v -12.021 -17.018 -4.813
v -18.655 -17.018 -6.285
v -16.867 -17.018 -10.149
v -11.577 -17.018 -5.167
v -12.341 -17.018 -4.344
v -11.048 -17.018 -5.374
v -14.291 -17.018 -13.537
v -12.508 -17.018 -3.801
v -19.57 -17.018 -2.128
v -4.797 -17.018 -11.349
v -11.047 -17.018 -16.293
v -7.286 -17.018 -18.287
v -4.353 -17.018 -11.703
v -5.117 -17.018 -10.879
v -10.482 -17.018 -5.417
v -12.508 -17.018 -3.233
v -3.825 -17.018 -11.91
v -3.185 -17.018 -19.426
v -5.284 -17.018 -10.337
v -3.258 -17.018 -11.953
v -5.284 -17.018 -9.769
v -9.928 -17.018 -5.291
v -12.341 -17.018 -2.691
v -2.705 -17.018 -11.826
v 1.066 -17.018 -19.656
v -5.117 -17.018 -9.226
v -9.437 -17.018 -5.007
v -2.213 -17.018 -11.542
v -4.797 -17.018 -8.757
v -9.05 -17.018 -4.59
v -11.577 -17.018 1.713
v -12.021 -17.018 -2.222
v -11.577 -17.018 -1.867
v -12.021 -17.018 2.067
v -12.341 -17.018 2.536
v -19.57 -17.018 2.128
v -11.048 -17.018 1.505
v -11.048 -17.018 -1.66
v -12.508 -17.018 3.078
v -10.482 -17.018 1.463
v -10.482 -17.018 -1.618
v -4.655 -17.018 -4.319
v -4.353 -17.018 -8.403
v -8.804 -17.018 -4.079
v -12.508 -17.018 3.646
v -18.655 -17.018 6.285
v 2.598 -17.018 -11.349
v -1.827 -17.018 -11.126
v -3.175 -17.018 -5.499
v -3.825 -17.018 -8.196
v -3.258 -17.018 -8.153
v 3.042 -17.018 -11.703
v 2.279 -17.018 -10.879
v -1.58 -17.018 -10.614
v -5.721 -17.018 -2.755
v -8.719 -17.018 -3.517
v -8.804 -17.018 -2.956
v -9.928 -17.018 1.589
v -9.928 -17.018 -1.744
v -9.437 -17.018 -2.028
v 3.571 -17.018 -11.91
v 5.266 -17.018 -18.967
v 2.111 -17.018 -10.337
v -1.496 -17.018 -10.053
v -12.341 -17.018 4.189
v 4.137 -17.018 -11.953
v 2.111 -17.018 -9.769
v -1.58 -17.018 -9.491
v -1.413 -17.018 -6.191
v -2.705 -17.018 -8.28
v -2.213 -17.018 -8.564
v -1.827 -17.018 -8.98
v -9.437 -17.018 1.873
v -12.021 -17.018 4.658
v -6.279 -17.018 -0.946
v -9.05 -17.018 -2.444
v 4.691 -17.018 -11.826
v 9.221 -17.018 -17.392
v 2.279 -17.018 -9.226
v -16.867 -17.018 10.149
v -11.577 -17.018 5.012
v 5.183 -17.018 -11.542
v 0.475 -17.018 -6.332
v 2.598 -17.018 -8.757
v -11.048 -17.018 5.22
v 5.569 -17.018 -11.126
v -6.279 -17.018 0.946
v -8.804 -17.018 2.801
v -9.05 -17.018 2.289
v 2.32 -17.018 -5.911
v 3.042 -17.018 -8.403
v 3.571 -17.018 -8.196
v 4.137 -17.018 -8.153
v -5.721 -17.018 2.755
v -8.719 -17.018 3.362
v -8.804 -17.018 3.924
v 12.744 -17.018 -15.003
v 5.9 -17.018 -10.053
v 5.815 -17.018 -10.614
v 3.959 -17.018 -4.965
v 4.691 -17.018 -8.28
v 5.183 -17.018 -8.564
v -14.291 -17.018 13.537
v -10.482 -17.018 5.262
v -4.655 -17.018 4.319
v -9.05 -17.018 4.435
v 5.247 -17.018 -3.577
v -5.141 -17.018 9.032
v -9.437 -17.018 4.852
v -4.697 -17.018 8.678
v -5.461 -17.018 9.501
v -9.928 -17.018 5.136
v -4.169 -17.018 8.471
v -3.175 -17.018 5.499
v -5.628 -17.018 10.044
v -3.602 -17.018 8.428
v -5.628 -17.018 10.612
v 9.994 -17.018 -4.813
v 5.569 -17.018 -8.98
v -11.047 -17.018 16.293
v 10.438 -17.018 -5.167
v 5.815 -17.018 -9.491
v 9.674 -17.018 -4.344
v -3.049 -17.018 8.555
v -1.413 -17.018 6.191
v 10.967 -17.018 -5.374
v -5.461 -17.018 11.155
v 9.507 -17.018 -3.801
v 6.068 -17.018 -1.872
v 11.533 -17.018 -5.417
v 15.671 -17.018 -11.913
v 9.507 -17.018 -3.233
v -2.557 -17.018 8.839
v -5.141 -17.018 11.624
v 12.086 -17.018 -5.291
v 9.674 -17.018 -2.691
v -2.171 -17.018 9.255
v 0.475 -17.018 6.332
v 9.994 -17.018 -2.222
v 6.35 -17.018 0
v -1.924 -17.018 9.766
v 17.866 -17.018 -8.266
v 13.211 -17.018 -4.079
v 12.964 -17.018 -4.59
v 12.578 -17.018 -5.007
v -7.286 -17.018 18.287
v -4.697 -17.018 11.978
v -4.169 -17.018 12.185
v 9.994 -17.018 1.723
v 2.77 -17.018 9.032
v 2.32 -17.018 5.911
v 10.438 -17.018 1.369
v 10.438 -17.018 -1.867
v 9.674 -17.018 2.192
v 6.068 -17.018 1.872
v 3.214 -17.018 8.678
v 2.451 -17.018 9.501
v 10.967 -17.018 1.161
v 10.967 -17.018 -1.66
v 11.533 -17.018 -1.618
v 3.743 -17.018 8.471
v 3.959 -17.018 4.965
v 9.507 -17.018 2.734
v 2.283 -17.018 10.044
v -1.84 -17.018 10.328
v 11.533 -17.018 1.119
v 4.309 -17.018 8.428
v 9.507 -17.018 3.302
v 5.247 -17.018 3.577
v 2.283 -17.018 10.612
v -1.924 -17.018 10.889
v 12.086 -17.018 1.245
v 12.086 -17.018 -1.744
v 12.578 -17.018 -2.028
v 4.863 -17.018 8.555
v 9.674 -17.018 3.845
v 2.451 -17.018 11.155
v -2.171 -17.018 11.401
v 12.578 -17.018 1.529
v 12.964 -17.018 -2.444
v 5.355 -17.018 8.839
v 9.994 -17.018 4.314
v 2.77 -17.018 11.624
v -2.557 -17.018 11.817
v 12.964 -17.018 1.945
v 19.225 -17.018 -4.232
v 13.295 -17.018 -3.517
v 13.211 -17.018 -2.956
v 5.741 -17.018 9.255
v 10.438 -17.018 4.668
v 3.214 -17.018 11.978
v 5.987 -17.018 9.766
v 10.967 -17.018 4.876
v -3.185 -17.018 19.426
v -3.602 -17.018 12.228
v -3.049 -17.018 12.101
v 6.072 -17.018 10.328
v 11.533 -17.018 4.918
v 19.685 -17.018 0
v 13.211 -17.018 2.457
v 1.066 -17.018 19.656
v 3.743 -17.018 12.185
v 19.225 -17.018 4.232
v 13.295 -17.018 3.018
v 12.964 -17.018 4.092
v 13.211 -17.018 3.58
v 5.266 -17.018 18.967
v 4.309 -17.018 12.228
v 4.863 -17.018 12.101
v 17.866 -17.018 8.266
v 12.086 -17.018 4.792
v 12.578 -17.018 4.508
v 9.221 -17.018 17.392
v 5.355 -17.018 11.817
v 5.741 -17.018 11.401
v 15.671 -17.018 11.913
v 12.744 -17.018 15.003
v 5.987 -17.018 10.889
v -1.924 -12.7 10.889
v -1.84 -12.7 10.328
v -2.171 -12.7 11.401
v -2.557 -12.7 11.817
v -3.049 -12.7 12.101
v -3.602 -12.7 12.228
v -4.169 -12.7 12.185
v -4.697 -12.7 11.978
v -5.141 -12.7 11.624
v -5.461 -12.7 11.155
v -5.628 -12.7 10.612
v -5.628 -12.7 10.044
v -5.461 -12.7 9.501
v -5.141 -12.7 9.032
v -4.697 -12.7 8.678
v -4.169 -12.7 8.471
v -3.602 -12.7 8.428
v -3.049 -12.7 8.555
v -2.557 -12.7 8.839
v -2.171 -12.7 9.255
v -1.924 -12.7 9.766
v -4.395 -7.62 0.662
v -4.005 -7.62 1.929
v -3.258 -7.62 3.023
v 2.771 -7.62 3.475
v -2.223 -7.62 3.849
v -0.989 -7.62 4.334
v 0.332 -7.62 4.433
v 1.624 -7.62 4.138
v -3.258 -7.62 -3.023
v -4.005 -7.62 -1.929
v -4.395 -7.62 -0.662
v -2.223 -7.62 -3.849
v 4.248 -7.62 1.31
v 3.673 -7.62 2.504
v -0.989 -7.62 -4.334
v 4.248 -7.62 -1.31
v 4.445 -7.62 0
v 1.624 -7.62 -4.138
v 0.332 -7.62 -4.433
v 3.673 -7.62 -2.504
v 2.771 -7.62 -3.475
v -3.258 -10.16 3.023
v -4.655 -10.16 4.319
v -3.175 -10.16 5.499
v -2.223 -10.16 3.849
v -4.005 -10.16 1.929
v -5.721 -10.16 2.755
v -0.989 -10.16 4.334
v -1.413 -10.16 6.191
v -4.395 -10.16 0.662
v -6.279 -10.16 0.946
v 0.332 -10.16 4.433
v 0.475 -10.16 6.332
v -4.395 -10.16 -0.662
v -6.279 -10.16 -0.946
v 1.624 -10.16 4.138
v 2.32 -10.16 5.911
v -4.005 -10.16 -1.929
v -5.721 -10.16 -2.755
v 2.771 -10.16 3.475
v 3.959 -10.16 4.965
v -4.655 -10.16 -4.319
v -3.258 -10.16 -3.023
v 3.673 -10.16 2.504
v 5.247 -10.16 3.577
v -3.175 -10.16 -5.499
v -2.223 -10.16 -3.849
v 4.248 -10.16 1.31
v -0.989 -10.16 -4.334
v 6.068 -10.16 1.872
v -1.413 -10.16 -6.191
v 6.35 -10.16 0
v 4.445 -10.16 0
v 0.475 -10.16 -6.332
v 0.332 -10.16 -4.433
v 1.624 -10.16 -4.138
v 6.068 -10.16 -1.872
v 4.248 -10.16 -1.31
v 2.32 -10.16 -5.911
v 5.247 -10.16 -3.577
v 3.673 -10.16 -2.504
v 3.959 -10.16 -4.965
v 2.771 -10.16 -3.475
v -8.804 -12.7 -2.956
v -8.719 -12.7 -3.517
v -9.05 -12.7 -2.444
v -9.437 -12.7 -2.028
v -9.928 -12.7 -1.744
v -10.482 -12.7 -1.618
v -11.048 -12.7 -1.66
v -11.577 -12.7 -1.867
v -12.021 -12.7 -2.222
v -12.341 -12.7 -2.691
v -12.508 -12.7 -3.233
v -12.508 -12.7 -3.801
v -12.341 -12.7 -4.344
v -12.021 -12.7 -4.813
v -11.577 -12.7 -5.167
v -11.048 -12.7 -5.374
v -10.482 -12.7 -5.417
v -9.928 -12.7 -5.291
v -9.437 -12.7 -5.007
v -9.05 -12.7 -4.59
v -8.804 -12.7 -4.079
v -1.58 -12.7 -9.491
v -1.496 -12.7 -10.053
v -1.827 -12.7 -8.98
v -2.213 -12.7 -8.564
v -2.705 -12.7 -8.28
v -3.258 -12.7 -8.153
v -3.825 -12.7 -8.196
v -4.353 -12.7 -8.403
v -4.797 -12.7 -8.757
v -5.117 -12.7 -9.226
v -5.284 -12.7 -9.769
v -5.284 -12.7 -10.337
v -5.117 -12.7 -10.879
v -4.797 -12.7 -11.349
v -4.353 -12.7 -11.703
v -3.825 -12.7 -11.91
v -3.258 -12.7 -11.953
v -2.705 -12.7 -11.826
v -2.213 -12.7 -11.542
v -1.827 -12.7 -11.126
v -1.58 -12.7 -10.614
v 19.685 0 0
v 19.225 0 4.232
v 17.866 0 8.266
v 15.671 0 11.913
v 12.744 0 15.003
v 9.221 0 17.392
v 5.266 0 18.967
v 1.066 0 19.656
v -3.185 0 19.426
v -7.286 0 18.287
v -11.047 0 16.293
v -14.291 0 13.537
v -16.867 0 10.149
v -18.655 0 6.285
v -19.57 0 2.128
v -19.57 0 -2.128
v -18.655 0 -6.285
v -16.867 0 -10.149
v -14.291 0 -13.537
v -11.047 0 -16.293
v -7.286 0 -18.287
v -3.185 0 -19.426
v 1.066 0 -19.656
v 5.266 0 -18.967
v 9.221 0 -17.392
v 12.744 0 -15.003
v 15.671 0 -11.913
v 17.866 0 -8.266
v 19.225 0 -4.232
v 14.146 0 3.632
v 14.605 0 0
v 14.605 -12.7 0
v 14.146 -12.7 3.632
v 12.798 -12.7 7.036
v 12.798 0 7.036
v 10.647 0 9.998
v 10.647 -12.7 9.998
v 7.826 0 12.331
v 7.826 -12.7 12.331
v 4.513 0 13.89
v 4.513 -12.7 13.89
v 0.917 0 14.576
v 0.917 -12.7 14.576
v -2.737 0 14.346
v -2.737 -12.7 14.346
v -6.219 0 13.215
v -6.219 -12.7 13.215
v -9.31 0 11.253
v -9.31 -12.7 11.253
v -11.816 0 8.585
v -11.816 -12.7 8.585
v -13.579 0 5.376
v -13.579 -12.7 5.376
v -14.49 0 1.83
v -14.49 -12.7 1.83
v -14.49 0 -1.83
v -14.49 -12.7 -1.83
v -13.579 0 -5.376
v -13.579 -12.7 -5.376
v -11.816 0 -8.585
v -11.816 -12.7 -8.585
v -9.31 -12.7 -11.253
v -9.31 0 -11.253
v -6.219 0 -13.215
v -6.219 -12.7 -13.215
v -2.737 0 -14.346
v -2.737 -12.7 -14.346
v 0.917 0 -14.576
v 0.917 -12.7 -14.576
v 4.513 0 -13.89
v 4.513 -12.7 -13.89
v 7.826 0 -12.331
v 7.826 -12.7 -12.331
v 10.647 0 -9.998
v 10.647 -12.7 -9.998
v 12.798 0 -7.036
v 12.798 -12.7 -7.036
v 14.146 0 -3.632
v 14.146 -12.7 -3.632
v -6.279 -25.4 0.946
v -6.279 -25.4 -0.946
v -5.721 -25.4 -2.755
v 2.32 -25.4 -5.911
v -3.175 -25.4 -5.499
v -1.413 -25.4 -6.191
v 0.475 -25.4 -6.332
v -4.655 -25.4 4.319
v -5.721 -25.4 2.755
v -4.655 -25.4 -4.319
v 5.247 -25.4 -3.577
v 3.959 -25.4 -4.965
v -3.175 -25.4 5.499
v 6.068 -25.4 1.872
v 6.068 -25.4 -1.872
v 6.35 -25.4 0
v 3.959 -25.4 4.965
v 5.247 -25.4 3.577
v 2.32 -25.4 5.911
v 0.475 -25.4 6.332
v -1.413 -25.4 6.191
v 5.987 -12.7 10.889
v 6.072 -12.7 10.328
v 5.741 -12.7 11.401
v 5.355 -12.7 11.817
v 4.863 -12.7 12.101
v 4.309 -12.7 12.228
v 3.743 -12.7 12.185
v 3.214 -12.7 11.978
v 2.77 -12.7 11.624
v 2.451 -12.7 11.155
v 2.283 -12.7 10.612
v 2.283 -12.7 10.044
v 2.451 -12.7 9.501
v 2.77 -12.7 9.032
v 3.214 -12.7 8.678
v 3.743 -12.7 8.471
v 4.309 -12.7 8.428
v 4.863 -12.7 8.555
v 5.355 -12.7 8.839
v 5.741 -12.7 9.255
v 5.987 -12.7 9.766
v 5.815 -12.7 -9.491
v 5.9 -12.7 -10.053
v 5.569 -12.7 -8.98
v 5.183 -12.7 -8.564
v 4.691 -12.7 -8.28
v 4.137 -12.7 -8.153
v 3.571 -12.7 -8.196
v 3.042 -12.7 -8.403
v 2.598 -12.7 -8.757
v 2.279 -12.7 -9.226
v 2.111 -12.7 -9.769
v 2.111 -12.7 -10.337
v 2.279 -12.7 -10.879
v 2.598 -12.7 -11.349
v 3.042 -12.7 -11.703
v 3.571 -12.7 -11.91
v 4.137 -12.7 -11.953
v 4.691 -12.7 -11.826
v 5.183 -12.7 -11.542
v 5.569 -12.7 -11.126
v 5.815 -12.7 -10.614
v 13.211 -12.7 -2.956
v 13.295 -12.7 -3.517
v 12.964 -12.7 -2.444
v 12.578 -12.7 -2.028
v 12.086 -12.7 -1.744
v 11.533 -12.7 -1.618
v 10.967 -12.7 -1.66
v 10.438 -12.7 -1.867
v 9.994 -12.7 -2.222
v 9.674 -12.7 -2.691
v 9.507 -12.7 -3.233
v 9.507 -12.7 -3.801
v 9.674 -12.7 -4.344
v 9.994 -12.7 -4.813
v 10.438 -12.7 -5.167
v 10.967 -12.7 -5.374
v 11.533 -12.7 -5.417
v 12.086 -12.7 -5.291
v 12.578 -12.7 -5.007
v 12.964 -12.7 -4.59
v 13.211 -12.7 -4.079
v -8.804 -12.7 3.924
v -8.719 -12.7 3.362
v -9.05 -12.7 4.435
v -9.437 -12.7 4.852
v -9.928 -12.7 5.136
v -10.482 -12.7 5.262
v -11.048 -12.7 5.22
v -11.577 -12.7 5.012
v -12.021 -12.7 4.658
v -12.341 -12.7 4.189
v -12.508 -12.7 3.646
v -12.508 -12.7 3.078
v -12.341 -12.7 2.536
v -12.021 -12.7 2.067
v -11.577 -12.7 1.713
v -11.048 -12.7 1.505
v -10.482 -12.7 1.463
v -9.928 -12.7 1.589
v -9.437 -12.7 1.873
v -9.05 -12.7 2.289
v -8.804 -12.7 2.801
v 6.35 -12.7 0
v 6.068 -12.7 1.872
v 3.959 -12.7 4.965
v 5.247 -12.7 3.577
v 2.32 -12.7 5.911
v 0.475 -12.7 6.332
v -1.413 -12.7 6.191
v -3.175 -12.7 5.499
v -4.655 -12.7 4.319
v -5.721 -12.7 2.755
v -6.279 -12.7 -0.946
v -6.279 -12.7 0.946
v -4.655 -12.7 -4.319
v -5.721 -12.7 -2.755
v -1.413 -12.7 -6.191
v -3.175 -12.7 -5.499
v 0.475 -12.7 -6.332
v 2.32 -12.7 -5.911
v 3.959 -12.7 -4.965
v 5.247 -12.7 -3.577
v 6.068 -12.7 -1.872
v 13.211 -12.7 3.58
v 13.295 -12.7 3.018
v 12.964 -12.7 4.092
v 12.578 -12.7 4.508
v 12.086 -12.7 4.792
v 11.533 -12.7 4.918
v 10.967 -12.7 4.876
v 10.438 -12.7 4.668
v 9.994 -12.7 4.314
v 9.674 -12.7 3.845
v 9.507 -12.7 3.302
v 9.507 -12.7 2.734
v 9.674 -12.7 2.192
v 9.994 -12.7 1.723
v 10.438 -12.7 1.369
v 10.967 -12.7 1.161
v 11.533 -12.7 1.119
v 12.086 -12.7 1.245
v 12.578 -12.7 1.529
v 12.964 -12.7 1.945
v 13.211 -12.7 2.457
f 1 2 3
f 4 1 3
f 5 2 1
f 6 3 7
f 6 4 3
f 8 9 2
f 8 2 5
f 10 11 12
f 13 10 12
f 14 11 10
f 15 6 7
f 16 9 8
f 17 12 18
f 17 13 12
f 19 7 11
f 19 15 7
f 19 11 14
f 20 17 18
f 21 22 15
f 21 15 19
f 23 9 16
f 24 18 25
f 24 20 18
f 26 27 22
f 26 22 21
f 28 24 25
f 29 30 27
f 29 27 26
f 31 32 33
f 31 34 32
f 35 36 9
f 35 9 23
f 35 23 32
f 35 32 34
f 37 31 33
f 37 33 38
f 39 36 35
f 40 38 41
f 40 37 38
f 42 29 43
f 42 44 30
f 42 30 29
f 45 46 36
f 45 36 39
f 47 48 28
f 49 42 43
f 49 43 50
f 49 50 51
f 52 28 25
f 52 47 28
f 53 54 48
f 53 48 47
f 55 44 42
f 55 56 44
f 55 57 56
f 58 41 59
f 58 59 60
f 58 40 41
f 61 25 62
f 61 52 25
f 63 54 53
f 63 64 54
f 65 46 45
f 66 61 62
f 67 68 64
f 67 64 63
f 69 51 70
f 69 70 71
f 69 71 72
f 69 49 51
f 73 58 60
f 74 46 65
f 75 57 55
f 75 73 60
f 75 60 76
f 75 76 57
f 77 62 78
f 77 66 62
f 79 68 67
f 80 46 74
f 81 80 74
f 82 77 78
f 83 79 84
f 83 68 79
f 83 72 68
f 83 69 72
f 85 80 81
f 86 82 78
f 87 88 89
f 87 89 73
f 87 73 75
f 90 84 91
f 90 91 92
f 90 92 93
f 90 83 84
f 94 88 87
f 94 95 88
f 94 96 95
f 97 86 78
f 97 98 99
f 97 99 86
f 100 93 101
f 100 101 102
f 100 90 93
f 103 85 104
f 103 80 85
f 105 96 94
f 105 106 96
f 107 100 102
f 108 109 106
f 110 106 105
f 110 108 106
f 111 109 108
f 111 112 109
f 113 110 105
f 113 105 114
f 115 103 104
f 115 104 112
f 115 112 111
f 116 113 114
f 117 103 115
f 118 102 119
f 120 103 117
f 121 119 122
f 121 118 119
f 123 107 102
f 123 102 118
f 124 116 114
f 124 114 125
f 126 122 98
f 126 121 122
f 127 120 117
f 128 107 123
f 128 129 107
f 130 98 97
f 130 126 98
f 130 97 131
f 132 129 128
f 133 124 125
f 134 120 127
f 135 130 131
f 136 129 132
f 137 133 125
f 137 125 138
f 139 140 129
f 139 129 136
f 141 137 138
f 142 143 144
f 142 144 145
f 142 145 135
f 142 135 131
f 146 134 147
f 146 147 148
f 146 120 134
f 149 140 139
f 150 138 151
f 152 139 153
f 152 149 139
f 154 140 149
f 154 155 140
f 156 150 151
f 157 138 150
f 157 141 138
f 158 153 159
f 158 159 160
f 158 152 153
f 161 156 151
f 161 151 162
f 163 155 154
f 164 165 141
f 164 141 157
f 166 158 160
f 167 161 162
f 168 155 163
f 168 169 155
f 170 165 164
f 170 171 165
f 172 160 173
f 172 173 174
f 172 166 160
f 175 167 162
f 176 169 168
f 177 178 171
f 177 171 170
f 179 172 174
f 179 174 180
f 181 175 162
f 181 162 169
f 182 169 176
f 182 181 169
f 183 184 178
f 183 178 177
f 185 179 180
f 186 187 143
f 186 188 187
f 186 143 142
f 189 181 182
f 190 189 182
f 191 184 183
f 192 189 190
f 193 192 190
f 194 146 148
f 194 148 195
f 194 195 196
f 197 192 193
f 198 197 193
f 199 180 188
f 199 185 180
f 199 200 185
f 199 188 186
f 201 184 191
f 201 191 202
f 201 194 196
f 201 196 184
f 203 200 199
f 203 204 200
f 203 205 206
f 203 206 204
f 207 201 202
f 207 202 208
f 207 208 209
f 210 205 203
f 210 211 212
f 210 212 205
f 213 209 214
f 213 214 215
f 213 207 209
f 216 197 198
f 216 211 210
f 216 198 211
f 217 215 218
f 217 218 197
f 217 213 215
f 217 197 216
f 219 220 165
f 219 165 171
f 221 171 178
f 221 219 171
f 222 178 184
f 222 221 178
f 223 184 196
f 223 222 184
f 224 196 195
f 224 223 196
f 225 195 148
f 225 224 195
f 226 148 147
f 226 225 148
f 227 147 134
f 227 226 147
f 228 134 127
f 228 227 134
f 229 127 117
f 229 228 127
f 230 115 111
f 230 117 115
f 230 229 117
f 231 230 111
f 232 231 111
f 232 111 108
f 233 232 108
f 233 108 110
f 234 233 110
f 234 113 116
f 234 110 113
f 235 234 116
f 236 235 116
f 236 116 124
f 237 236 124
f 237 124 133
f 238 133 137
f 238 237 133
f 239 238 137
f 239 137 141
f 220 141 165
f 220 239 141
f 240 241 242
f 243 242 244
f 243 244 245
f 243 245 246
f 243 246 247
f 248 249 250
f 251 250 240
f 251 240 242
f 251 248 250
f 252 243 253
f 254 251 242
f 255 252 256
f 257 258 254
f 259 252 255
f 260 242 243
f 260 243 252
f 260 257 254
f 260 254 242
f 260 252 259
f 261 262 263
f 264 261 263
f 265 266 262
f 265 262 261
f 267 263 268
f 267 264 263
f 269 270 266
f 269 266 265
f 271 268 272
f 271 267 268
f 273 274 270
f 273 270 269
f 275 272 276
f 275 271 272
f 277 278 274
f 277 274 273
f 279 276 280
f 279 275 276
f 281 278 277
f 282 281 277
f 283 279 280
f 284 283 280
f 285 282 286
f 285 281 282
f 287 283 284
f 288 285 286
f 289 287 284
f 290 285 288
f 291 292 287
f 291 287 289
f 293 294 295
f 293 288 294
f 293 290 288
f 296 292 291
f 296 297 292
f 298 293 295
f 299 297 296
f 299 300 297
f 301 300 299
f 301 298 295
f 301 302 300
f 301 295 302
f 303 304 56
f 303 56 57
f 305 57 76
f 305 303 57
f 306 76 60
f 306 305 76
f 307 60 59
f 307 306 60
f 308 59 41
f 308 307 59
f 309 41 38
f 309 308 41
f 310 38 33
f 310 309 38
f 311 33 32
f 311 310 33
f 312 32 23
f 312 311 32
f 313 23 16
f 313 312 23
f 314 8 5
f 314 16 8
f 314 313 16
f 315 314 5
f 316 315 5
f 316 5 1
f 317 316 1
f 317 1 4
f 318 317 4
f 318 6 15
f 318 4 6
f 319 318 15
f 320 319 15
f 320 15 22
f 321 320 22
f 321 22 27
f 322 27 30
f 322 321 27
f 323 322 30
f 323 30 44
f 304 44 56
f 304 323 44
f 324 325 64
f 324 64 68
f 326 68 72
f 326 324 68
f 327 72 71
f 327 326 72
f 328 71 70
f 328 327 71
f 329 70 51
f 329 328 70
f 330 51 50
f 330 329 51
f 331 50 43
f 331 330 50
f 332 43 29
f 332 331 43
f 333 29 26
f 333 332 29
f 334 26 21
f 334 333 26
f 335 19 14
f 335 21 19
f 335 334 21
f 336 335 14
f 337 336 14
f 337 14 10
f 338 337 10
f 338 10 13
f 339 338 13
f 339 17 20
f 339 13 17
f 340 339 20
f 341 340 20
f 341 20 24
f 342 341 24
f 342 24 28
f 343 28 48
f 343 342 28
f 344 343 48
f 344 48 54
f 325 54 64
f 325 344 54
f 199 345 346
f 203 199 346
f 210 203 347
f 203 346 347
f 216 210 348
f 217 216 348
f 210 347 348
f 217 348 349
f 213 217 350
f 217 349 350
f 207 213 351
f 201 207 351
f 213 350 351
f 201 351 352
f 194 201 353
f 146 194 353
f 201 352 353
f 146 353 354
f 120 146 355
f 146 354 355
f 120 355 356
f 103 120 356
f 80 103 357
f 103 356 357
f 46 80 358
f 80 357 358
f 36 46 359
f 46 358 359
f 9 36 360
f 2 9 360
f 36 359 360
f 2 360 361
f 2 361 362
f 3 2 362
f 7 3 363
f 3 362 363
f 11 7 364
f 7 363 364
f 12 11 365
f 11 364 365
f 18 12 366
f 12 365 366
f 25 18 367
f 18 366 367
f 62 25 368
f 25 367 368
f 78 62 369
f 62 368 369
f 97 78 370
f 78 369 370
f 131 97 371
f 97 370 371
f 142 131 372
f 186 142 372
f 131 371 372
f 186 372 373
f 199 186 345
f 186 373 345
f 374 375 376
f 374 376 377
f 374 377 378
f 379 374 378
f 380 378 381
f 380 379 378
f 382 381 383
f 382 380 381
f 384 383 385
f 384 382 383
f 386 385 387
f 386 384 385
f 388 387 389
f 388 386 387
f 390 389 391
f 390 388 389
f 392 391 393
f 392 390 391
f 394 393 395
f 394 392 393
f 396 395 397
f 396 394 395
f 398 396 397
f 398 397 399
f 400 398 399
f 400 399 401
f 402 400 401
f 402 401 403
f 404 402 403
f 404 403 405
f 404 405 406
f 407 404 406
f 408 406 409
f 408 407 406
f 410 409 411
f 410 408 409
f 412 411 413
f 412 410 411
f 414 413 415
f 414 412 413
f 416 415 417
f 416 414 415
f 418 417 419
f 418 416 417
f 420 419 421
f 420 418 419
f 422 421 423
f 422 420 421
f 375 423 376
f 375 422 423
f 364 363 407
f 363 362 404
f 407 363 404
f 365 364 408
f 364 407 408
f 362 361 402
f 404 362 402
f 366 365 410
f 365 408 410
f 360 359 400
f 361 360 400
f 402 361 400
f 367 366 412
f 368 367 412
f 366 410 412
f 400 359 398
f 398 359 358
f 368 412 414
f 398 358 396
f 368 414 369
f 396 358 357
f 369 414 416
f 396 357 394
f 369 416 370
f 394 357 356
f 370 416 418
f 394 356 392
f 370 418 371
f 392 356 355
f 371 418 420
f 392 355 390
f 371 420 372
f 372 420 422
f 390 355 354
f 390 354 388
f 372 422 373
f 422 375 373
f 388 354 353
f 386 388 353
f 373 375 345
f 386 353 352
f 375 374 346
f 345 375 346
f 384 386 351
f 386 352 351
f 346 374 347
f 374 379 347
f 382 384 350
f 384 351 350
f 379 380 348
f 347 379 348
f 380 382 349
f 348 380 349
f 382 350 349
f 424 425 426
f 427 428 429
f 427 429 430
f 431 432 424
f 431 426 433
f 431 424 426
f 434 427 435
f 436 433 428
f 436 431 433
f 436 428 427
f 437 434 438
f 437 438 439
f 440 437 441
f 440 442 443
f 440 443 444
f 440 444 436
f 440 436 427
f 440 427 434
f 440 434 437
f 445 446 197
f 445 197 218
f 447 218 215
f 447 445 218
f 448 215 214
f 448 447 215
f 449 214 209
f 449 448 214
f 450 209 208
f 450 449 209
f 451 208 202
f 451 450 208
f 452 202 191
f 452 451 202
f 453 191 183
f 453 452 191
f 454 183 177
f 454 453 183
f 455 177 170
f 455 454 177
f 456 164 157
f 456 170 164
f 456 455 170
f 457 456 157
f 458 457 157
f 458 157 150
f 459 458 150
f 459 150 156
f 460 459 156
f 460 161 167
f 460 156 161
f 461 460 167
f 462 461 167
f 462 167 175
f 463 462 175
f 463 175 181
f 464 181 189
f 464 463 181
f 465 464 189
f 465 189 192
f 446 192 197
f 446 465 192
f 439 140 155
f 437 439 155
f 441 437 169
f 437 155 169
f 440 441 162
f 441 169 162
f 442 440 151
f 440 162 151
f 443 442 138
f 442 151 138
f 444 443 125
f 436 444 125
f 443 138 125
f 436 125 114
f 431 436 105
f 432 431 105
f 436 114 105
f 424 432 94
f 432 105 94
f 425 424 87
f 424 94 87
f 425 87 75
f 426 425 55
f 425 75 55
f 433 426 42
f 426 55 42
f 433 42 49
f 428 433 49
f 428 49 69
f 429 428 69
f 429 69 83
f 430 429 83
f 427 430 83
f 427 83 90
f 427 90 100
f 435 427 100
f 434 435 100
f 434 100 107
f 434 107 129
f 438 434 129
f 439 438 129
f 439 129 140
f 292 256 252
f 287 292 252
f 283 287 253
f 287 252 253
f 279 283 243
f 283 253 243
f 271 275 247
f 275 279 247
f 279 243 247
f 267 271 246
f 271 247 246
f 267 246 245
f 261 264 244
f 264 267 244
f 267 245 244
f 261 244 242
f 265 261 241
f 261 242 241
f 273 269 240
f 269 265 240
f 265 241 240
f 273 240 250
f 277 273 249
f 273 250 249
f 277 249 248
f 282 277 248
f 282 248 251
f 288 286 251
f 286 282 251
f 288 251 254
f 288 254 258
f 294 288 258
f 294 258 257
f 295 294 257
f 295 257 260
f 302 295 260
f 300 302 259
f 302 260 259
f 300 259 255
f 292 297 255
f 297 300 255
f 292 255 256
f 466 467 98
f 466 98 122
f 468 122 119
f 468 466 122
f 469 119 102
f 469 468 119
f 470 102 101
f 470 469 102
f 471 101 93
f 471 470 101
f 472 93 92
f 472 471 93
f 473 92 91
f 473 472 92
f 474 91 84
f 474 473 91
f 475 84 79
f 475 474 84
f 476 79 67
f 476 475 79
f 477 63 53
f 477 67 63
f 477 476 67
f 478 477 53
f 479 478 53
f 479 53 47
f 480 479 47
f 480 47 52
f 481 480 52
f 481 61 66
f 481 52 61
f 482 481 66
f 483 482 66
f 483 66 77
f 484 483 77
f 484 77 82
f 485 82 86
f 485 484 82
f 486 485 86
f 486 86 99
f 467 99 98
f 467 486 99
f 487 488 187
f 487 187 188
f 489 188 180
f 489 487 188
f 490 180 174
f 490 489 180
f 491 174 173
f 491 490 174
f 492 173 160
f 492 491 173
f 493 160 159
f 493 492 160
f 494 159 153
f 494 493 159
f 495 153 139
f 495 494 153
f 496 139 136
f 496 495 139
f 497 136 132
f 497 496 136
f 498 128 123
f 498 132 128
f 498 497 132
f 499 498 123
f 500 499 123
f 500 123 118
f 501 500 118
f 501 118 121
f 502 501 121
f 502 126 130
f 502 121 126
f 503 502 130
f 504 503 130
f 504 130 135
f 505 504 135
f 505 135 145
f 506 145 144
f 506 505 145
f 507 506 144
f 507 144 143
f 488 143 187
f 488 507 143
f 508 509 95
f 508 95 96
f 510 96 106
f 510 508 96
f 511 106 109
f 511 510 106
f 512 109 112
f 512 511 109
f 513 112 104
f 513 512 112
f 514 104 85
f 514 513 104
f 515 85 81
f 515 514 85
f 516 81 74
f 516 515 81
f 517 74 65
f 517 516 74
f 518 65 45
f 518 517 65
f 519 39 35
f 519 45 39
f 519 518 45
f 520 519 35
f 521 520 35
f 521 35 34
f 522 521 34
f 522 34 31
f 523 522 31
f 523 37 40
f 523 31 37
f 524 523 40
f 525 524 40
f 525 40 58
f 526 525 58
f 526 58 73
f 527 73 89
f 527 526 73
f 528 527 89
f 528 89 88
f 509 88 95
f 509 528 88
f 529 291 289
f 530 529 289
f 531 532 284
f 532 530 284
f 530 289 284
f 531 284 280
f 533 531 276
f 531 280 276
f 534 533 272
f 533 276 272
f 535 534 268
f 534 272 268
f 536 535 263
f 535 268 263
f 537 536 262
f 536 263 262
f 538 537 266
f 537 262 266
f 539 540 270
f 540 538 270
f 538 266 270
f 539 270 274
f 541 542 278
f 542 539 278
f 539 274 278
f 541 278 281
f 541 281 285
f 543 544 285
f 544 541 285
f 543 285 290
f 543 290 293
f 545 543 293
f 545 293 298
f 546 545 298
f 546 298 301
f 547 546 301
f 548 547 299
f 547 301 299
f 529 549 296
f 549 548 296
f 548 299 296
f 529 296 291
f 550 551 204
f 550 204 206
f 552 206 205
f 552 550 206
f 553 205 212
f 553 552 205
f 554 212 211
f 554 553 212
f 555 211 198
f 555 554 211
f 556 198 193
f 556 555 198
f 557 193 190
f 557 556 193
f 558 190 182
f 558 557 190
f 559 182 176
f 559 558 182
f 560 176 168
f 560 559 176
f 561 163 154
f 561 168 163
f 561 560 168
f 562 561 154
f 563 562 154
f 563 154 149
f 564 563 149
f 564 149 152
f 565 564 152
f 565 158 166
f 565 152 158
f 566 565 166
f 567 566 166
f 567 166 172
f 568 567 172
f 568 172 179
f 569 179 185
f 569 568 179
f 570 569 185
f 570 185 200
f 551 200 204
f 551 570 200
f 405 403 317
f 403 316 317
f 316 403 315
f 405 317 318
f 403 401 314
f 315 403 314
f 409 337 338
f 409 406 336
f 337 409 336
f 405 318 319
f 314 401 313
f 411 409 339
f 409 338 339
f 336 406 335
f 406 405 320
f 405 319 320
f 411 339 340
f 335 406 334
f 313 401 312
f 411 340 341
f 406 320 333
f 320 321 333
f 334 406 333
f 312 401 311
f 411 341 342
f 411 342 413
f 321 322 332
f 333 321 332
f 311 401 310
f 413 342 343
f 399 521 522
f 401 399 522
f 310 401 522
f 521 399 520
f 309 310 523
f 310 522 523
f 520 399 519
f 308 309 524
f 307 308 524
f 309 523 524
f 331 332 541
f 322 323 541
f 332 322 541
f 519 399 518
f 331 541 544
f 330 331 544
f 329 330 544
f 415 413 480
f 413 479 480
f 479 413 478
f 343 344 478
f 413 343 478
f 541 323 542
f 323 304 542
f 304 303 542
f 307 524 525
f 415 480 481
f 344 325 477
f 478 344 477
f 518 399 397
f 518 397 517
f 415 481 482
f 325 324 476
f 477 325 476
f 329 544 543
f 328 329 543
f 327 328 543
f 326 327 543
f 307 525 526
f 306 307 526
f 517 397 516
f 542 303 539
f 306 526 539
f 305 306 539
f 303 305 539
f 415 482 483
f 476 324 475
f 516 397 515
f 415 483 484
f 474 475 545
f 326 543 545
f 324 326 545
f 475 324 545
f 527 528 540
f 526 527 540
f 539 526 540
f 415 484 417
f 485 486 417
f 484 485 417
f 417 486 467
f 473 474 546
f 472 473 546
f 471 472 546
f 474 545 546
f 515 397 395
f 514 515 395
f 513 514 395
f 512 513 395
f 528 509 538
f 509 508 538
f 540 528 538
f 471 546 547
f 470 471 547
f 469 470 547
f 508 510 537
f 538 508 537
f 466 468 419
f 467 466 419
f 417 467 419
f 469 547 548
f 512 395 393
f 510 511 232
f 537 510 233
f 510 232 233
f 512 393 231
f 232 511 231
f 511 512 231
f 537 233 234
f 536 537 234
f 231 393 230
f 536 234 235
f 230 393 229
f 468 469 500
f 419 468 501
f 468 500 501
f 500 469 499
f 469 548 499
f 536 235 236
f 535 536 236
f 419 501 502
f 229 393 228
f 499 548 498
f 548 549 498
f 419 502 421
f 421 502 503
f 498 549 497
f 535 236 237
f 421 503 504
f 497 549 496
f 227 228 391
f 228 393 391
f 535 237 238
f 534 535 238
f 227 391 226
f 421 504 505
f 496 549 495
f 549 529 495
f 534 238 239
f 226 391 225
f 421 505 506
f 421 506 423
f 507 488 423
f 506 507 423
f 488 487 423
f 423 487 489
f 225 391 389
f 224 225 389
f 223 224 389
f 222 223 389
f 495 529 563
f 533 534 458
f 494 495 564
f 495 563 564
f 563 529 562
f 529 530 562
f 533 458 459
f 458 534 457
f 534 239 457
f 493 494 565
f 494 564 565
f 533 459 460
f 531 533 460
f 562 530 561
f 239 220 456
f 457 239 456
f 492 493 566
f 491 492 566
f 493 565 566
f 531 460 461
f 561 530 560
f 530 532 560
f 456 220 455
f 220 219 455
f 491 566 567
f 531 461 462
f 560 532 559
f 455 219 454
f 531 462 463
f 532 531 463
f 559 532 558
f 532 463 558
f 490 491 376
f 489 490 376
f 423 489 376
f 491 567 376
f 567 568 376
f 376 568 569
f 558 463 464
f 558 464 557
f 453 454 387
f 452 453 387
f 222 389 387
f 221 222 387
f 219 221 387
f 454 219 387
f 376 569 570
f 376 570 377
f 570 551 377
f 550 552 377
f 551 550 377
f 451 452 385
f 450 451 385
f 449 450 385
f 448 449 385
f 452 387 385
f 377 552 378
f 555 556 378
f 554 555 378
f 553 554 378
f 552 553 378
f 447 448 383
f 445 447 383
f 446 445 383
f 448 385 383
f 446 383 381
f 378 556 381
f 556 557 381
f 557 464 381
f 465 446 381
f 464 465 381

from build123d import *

# Parameters (mm, degrees)
F0_R       = 19.685
F1_DEPTH   = 17.018
F2_R       = 14.605
F3_DEPTH   = 12.7
F4_R       = 1.905
F5_DEPTH   = 21.336
F6_R       = 6.35
F7_DEPTH   = 25.4
F7_FACE_R  = 6.35
F8_DEPTH   = 10.16
F9_R       = 4.445
F10_DEPTH  = 25.4
F10_FACE_R = 4.445
F11_DEPTH  = 7.62


with BuildPart() as f1:
    # F0 (on Front) → F1 (new body)
    with BuildSketch(Plane.XZ):
        Circle(F0_R)
    extrude(amount=F1_DEPTH)

    # F2 (on Front) → F3 (cut)
    with BuildSketch(Plane.XZ):
        Circle(F2_R)
    extrude(amount=F3_DEPTH, mode=Mode.SUBTRACT)

    # F4 (on Front) → F5 (cut)
    with BuildSketch(Plane.XZ):
        with Locations((-3.744667, 10.32798)):
            Circle(F4_R)
        with Locations((-10.624286, 3.362366)):
            Circle(F4_R)
        with Locations((-10.624286, -3.517252)):
            Circle(F4_R)
        with Locations((-3.400686, -10.05289)):
            Circle(F4_R)
        with Locations((3.994903, -10.05289)):
            Circle(F4_R)
        with Locations((11.390493, -3.517252)):
            Circle(F4_R)
        with Locations((4.166894, 10.32798)):
            Circle(F4_R)
        with Locations((11.390493, 3.018385)):
            Circle(F4_R)
    extrude(amount=F5_DEPTH, mode=Mode.SUBTRACT)

    # F6 (on Front) → F7 (join)
    with BuildSketch(Plane.XZ):
        Circle(F6_R)
    extrude(amount=F7_DEPTH)

    # F7_face (on face) → F8 (cut)
    with BuildSketch(Plane(origin=(0, 0, 0), x_dir=(1, 0, 0), z_dir=(0, 1, 0))):
        Circle(F7_FACE_R)
    extrude(amount=-F8_DEPTH, mode=Mode.SUBTRACT)

    # F9 (on Front) → F10 (join)
    with BuildSketch(Plane.XZ):
        Circle(F9_R)
    extrude(amount=F10_DEPTH)

    # F10_face (on face) → F11 (cut)
    with BuildSketch(Plane(origin=(0, 0, 0), x_dir=(1, 0, 0), z_dir=(0, 1, 0))):
        Circle(F10_FACE_R)
    extrude(amount=-F11_DEPTH, mode=Mode.SUBTRACT)


solid = f1.part
